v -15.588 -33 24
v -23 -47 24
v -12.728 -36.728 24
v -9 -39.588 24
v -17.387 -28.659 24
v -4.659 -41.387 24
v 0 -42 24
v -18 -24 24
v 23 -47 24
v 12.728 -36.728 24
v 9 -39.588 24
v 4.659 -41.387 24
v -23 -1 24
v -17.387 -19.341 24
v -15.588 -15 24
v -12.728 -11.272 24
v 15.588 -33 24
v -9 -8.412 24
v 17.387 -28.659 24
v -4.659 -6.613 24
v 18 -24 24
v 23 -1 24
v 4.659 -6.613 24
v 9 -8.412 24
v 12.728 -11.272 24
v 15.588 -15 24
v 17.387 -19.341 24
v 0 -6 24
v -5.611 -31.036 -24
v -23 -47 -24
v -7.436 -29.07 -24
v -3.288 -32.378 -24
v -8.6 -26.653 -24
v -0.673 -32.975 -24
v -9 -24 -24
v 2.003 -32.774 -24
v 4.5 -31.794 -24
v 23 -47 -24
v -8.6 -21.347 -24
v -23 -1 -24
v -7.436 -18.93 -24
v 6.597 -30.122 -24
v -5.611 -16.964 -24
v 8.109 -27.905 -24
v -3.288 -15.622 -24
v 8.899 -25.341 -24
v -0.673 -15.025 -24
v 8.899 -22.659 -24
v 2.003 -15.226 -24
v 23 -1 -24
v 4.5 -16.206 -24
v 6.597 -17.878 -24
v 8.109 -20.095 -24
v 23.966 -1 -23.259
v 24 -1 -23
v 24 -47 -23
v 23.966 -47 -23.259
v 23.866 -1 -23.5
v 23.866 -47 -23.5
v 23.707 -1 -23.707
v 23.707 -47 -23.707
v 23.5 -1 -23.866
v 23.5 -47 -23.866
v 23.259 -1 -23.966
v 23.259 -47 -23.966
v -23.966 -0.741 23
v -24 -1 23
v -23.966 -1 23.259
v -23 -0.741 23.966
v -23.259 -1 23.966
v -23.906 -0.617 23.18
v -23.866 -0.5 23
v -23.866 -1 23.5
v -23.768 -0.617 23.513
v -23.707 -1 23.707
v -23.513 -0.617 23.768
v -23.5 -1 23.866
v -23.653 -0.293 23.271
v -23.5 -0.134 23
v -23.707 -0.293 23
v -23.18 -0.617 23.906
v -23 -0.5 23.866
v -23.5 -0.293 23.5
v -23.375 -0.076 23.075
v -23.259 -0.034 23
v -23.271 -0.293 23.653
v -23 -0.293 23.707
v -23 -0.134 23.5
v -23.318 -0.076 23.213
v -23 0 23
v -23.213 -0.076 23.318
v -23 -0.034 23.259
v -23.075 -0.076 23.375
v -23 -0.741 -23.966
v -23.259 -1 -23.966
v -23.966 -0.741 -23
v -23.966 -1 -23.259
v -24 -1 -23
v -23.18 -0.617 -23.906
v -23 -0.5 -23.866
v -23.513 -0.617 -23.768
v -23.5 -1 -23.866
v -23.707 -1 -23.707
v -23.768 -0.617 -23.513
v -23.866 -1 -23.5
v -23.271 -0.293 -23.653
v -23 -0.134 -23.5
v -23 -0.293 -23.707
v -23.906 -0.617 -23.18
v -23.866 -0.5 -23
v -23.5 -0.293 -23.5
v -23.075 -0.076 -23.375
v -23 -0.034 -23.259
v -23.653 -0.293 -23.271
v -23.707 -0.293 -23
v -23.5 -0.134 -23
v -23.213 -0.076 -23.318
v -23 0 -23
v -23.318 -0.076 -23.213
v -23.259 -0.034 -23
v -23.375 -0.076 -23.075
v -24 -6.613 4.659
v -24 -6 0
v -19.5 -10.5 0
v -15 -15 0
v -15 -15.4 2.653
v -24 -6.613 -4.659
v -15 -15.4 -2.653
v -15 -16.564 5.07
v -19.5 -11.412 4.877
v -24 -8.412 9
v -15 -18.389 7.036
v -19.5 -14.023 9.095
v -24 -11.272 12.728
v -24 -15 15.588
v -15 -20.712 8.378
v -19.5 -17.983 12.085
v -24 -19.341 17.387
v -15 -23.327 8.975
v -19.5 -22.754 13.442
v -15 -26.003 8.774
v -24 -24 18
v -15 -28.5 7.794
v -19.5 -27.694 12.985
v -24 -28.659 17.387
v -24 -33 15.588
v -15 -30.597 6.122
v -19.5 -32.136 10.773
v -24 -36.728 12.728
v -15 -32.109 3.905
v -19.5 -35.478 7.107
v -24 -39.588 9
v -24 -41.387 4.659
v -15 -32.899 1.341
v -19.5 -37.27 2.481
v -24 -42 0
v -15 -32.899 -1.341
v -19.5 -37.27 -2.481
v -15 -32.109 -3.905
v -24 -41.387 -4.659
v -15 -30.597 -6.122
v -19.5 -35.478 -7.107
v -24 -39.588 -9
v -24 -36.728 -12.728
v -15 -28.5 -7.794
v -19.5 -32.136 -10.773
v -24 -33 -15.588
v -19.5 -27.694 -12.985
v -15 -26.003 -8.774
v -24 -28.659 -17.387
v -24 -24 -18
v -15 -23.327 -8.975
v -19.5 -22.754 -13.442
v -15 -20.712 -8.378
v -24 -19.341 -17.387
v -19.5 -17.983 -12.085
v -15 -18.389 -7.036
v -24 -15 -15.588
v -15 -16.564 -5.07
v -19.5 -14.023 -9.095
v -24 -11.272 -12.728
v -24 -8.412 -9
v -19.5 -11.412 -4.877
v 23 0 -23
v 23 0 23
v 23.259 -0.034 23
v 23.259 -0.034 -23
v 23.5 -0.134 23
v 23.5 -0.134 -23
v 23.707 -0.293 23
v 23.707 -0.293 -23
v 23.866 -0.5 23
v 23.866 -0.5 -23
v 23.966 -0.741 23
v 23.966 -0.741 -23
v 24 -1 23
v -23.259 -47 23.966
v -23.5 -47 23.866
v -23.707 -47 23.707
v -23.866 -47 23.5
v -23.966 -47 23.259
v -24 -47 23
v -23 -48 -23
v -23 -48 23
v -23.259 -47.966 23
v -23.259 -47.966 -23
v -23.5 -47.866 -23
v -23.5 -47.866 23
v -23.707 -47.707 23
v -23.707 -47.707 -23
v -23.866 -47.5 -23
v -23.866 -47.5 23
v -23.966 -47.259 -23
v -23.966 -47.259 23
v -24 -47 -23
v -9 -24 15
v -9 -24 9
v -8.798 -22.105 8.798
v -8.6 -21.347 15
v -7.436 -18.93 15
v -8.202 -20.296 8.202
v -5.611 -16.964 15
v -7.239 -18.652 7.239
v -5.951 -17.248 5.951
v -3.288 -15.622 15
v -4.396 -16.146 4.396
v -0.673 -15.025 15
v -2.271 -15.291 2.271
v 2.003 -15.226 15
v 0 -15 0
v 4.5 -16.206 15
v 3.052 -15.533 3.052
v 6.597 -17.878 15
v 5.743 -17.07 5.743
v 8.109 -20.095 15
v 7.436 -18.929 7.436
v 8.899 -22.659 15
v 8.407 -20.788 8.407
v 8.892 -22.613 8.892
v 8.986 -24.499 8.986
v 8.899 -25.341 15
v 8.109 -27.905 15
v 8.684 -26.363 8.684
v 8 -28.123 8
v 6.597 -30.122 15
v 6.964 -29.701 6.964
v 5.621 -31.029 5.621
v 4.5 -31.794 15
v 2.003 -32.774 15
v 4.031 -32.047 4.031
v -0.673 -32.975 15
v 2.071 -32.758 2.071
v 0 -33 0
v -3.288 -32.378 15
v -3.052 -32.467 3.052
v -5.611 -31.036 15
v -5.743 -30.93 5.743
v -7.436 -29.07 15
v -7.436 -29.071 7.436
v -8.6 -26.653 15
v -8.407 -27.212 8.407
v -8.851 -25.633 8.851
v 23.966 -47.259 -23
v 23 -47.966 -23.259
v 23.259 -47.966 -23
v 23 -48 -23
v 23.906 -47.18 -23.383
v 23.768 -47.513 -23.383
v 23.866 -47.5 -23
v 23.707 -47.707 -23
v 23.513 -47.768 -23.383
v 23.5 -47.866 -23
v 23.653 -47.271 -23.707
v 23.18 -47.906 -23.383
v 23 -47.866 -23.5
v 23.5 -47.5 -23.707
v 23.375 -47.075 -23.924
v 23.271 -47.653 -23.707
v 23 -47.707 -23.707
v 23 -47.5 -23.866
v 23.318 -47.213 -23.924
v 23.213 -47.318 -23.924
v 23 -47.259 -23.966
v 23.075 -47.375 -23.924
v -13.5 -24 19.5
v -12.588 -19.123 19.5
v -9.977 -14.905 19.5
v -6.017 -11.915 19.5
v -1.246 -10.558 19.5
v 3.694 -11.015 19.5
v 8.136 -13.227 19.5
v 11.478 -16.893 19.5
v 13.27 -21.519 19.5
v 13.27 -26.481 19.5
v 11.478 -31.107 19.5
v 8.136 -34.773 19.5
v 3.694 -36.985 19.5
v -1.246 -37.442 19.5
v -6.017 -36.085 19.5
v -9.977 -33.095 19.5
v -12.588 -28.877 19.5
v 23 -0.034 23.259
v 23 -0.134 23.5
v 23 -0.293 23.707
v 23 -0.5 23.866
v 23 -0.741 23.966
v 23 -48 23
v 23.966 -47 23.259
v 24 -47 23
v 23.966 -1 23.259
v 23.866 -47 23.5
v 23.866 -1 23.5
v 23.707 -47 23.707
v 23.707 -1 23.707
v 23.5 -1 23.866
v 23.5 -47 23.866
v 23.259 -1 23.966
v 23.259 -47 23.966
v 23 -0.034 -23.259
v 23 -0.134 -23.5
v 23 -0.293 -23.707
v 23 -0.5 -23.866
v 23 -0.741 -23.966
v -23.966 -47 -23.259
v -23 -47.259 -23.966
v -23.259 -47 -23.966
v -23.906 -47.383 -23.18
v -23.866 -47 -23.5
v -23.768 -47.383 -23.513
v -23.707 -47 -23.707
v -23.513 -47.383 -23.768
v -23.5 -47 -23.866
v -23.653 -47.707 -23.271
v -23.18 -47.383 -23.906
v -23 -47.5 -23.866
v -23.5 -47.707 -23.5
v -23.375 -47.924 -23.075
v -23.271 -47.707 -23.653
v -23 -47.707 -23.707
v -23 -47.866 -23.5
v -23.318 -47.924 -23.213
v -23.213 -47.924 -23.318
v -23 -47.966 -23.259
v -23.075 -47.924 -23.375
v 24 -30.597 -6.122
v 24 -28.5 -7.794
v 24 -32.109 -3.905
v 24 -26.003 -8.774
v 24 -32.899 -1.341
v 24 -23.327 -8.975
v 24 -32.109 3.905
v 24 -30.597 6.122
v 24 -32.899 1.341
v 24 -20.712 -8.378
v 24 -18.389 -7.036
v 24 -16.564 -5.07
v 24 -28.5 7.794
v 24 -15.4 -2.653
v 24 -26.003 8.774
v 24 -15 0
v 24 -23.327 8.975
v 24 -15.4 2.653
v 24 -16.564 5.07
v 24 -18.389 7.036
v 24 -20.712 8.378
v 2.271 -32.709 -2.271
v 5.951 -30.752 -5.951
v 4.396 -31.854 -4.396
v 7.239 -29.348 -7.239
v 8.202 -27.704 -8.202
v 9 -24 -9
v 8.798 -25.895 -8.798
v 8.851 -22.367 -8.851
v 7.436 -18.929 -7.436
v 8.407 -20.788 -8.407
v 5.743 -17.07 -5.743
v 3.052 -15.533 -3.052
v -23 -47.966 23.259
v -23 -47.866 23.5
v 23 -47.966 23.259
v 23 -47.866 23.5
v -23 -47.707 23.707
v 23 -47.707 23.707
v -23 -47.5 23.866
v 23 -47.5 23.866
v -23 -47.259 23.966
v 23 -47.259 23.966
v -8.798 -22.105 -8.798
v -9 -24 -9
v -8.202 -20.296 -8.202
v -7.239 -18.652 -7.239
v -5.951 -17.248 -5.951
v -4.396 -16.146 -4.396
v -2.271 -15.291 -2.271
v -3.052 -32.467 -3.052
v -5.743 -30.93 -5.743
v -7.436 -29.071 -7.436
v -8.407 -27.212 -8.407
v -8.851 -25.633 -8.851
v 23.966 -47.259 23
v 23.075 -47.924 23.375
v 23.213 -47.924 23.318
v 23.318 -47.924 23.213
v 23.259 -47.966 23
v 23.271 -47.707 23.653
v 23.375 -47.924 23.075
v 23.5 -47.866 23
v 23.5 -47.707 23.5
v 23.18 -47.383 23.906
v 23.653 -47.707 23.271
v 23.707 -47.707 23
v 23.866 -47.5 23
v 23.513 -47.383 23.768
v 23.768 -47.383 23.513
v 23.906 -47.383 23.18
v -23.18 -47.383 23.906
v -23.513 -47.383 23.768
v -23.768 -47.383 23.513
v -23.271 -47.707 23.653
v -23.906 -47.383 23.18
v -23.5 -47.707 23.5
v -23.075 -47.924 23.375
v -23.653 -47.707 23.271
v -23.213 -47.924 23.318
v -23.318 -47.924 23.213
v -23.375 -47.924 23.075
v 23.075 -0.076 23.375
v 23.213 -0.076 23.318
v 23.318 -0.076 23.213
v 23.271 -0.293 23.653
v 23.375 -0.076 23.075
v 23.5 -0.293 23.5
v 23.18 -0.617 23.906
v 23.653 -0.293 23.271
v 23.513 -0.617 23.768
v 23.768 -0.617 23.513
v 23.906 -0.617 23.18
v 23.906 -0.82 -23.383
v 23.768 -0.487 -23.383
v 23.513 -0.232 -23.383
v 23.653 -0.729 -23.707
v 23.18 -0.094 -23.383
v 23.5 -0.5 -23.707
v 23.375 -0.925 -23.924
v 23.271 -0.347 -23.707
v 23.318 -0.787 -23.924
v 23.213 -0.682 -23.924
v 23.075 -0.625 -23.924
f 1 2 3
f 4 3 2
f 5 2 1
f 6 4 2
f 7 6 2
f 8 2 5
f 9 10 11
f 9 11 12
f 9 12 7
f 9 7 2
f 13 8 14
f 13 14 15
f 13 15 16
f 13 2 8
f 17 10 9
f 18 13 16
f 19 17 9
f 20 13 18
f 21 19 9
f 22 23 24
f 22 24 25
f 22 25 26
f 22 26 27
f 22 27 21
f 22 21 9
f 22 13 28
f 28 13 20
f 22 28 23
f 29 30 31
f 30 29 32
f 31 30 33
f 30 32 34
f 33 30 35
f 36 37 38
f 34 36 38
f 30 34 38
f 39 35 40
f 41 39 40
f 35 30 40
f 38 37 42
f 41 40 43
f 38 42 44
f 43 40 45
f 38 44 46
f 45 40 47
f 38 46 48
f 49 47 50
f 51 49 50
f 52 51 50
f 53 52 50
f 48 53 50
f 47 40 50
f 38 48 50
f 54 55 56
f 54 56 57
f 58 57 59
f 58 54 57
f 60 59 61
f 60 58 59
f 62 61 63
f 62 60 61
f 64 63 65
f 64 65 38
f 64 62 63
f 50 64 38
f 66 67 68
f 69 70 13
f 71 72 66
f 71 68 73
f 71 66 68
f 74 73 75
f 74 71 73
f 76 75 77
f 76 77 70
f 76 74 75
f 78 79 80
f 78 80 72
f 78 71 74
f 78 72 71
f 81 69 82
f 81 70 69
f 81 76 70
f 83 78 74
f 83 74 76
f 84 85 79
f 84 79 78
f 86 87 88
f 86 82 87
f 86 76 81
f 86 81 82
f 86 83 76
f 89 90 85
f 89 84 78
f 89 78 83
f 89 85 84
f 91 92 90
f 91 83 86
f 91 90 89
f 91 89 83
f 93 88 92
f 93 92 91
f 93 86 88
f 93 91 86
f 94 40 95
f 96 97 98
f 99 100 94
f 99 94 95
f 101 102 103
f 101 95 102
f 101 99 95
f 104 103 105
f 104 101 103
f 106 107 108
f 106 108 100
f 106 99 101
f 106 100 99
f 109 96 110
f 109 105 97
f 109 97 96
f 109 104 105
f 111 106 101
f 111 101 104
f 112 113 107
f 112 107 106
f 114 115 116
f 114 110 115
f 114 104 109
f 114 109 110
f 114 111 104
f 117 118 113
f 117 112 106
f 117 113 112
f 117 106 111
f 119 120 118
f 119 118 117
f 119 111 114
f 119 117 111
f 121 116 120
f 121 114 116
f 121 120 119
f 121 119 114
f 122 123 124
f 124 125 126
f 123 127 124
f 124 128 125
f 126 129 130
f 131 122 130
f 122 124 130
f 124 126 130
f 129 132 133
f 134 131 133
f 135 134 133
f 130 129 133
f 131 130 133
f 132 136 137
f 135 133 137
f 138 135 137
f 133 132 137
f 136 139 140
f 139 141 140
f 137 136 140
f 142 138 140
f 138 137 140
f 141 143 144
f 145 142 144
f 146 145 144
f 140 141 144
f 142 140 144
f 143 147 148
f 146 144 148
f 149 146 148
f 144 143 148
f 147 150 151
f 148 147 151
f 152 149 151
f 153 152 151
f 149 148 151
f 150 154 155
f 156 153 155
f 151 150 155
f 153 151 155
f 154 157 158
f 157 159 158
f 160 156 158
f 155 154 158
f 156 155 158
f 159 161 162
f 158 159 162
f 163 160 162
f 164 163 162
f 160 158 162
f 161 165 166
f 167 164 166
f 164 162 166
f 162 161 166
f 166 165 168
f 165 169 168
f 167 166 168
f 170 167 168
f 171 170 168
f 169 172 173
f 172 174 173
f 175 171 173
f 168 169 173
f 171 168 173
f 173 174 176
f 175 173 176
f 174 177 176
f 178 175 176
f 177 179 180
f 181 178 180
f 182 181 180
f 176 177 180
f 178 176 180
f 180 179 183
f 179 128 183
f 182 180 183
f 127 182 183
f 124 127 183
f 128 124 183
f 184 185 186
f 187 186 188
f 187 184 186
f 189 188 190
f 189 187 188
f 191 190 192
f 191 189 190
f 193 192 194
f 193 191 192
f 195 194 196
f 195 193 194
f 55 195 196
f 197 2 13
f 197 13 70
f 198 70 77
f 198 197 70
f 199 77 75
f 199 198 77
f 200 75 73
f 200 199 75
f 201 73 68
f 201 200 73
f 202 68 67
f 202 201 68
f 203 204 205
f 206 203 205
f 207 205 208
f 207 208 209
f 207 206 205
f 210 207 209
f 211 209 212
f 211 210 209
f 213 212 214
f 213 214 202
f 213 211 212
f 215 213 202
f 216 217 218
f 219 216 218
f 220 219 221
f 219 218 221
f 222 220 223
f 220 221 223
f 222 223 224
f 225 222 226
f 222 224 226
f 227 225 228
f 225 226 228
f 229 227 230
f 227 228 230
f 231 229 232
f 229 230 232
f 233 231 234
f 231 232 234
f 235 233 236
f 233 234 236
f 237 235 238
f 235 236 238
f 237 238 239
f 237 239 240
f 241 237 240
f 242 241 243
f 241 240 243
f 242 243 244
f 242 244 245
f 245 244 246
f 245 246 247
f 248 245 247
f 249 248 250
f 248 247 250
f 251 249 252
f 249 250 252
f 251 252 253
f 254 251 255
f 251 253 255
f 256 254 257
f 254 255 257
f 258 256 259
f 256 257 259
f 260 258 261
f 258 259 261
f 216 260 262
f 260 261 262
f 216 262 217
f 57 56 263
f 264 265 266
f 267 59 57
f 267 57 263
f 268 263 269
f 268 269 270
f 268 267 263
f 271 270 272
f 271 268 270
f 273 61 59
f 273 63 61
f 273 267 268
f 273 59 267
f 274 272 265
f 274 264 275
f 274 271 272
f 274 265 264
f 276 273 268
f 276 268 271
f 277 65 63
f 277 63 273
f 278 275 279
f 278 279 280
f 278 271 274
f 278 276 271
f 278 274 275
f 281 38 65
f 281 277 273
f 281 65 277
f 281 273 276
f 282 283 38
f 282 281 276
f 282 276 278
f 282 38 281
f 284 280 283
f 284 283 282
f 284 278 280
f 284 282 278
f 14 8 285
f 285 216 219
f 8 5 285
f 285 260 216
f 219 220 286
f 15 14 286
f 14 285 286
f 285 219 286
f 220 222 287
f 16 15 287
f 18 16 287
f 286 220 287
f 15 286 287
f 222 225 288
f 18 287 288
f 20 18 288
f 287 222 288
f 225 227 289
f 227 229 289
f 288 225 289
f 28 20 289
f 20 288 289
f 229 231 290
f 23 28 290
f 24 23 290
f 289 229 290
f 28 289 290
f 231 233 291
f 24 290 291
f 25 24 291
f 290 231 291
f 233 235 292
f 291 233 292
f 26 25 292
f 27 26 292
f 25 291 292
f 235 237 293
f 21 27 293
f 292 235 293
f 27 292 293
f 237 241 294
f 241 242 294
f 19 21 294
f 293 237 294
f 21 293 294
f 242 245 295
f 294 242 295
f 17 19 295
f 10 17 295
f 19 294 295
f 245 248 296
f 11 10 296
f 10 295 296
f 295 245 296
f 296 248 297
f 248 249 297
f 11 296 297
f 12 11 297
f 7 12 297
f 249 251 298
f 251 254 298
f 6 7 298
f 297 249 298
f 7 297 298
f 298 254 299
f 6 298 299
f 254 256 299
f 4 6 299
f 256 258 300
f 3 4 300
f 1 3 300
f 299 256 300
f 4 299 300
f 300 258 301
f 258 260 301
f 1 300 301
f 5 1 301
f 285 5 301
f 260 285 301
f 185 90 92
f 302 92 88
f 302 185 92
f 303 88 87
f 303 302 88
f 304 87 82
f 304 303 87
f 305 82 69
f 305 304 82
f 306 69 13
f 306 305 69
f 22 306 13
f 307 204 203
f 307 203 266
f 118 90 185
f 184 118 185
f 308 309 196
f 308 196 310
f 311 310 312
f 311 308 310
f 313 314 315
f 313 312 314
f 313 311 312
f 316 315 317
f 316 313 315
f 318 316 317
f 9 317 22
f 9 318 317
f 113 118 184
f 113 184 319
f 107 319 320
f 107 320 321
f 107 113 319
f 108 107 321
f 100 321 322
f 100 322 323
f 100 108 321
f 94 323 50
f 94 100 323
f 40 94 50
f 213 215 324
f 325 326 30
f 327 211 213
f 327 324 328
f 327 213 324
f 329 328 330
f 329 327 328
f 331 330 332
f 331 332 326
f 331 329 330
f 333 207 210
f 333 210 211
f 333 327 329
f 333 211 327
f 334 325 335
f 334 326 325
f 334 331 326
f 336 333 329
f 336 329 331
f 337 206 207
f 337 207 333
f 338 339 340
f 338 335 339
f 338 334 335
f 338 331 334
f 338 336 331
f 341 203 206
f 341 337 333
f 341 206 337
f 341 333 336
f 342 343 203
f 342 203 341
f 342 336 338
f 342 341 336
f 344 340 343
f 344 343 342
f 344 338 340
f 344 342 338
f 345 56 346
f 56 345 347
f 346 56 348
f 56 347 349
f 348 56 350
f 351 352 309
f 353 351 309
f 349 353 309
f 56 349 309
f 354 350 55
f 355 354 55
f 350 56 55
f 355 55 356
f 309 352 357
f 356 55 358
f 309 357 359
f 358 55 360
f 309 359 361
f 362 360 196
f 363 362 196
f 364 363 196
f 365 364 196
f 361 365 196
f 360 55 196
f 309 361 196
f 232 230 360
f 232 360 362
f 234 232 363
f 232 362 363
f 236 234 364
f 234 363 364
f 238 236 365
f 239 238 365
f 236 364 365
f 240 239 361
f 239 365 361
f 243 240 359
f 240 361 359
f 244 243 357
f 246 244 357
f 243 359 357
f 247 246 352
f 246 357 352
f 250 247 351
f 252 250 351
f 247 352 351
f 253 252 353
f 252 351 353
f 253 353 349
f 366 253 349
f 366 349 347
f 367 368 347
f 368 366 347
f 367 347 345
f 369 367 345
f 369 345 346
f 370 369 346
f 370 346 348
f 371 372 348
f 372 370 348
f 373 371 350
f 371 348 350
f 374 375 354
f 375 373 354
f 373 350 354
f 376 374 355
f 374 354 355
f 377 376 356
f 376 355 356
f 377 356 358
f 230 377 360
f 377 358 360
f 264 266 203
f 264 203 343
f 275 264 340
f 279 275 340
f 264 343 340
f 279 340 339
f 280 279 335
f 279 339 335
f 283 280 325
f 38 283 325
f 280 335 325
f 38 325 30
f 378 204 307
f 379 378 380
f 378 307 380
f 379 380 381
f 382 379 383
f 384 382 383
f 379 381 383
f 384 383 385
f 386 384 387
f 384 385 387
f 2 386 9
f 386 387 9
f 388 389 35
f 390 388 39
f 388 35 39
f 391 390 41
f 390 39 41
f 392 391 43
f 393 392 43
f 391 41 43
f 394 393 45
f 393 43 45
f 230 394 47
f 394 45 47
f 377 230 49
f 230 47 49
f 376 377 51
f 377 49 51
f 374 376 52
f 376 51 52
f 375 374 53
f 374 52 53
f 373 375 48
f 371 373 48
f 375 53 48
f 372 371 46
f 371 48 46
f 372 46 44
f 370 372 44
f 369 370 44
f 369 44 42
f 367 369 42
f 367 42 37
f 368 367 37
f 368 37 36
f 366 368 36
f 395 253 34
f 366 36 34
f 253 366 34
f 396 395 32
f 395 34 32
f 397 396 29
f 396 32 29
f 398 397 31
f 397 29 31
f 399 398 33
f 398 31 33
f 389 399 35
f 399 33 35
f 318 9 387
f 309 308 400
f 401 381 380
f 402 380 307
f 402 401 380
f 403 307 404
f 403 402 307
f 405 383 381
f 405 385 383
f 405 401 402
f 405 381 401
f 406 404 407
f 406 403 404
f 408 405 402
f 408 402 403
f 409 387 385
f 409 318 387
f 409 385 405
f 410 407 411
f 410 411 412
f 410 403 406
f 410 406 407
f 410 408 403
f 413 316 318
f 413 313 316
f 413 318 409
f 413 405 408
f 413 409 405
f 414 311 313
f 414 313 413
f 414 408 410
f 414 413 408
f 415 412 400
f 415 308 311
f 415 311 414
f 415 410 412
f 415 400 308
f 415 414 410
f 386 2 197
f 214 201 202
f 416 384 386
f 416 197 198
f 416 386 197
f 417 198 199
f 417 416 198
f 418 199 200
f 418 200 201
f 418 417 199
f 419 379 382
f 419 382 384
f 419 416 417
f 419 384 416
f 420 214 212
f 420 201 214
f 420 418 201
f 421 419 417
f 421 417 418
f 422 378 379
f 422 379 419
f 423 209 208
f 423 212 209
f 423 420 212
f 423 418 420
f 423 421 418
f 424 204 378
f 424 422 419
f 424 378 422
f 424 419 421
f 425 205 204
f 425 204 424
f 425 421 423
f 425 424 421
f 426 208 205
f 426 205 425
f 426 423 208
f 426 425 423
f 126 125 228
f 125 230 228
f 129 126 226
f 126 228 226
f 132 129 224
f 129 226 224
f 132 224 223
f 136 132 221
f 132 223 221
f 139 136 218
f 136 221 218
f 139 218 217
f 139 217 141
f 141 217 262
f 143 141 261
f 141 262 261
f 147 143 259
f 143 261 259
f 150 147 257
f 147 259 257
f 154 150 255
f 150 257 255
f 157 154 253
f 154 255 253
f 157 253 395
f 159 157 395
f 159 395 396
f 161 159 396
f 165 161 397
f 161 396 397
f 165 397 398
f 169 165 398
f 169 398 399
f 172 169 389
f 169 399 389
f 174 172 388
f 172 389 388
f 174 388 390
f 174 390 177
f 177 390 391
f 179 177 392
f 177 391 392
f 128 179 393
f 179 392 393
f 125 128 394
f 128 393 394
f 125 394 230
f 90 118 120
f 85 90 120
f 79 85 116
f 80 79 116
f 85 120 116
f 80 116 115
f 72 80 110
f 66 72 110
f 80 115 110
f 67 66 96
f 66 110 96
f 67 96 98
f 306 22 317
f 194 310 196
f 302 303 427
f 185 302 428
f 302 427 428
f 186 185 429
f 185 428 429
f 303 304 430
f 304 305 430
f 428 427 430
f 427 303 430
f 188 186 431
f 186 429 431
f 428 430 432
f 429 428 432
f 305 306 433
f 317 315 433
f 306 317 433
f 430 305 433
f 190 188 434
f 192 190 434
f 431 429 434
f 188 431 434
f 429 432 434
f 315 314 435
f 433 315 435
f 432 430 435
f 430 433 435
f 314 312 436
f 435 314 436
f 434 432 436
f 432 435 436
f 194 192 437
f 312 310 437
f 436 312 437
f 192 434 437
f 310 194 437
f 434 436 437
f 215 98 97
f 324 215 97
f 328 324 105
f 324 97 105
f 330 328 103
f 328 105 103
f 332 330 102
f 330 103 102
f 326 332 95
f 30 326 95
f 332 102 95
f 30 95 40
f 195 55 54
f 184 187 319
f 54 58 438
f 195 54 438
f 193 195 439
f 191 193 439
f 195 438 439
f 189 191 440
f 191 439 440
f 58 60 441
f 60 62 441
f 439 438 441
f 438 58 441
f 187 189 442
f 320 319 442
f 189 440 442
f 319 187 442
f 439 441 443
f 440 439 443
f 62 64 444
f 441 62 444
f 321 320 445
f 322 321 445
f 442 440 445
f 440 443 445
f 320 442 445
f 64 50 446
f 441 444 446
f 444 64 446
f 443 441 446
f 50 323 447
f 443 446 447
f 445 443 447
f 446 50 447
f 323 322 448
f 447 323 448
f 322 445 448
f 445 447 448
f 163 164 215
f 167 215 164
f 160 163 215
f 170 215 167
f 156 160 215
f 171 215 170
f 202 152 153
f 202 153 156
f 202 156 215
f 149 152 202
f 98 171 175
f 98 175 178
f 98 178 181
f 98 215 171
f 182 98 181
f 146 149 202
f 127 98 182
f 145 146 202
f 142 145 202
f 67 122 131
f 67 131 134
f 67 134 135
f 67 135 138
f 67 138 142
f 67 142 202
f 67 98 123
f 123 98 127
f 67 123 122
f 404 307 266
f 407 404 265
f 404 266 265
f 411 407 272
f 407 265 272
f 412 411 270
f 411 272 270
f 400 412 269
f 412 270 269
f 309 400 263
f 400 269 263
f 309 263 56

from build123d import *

# Parameters (mm, degrees)
F0_W           = 48
F0_H           = 48
F1_DEPTH       = 48
F2_R           = 1
F3_R           = 1
F4_T1_DEPTH    = 46
F4_T3_DEPTH    = 46
F4_T5_DEPTH    = 46
F4_S9_W        = 1
F4_S9_H        = 1
F4_T10_DEPTH   = 1
F4_S15_W       = 1
F4_S15_H       = 1
F4_T16_DEPTH   = 1
F4_S21_W       = 1
F4_S21_H       = 1
F4_T22_DEPTH   = 1
F4_S27_W       = 1
F4_S27_H       = 1
F4_T28_DEPTH   = 1
F4_T32_ANGLE   = 90
F4_T34_ANGLE   = 90
F6_D           = 18
F6_CSINK_D     = 36
F6_CSINK_ANGLE = 90
F8_D           = 18
F8_CSINK_D     = 36
F8_CSINK_ANGLE = 90


# Not quite as in the source:
# - a fillet or chamfer that OpenCascade refuses, or shapes differently, is made with other operations: its cross-section is extruded or revolved along the edge and cut away or added


with BuildPart() as f1:
    # F0 (on Front) → F1 (new body)
    with BuildSketch(Plane.XZ):
        Rectangle(F0_W, F0_H)
    extrude(amount=F1_DEPTH)

    # F2
    f2_edges = [f1.edges().sort_by_distance(p)[0] for p in [
        (24, -24, 24),
    ]]
    fillet(f2_edges, radius=F2_R)

    # F3
    f3_edges = [f1.edges().sort_by_distance(p)[0] for p in [
        (-24, -24, 24),
        (-0.5, 0, 24),
        (-0.5, -48, 24),
    ]]
    fillet(f3_edges, radius=F3_R)

    # F4: fillet of radius 1 on 8 edges, made by hand

    # F4_s2 → F4_t1 (cut)
    with BuildSketch(Plane.XY.offset(-23)):
        with BuildLine():
            ThreePointArc((-23, -48), (-23.7071067812, -47.7071067812), (-24, -47))
            Line((-24, -47), (-24, -48))
            Line((-24, -48), (-23, -48))
        make_face()
        with BuildLine():
            ThreePointArc((-23, 0), (-23.7071067812, -0.2928932188), (-24, -1))
            Line((-24, -1), (-24, 0))
            Line((-24, 0), (-23, 0))
        make_face()
    extrude(amount=F4_T1_DEPTH, mode=Mode.SUBTRACT)

    # F4_s4 → F4_t3 (cut)
    with BuildSketch(Plane.YZ.offset(-23)):
        with BuildLine():
            ThreePointArc((0, -23), (-0.2928932188, -23.7071067812), (-1, -24))
            Line((-1, -24), (0, -24))
            Line((0, -24), (0, -23))
        make_face()
        with BuildLine():
            ThreePointArc((-48, -23), (-47.7071067812, -23.7071067812), (-47, -24))
            Line((-47, -24), (-48, -24))
            Line((-48, -24), (-48, -23))
        make_face()
    extrude(amount=F4_T3_DEPTH, mode=Mode.SUBTRACT)

    # F4_s6 → F4_t5 (cut)
    with BuildSketch(Plane.XZ.offset(1)):
        with BuildLine():
            ThreePointArc((-24, -23), (-23.7071067812, -23.7071067812), (-23, -24))
            Line((-23, -24), (-24, -24))
            Line((-24, -24), (-24, -23))
        make_face()
        with BuildLine():
            ThreePointArc((24, -23), (23.7071067812, -23.7071067812), (23, -24))
            Line((23, -24), (24, -24))
            Line((24, -24), (24, -23))
        make_face()
    extrude(amount=F4_T5_DEPTH, mode=Mode.SUBTRACT)


with BuildPart() as f4_tool8:
    # F4_s9 → F4_t10 (new body)
    with BuildSketch(Plane.XZ.offset(1)):
        with Locations((-23.5, 23.5)):
            Rectangle(F4_S9_W, F4_S9_H)
    extrude(amount=-F4_T10_DEPTH)

    # F4_s11 → F4_t12 (revolve, cut)
    with BuildSketch(Plane(origin=(-23, -1, 23), x_dir=(0.7071067812, 0, -0.7071067812), z_dir=(0.7071067812, 0, 0.7071067812))):
        with BuildLine():
            ThreePointArc((0, -1), (1, 0), (0, 1))
            Line((0, 1), (0, -1))
        make_face()
    revolve(axis=Axis((-23, -1, 23), (0, 1, 0)), mode=Mode.SUBTRACT)


with BuildPart() as f1_1:
    add(f1.part)

    # F4_t7: cut F4_tool8
    add(f4_tool8.part, mode=Mode.SUBTRACT)


with BuildPart() as f4_tool14:
    # F4_s15 → F4_t16 (new body)
    with BuildSketch(Plane.XZ.offset(47)):
        with Locations((-23.5, 23.5)):
            Rectangle(F4_S15_W, F4_S15_H)
    extrude(amount=F4_T16_DEPTH)

    # F4_s17 → F4_t18 (revolve, cut)
    with BuildSketch(Plane(origin=(-23, -47, 23), x_dir=(0.7071067812, 0, -0.7071067812), z_dir=(-0.7071067812, 0, -0.7071067812))):
        with BuildLine():
            ThreePointArc((0, -1), (1, 0), (0, 1))
            Line((0, 1), (0, -1))
        make_face()
    revolve(axis=Axis((-23, -47, 23), (0, -1, 0)), mode=Mode.SUBTRACT)


with BuildPart() as f1_2:
    add(f1_1.part)

    # F4_t13: cut F4_tool14
    add(f4_tool14.part, mode=Mode.SUBTRACT)


with BuildPart() as f4_tool20:
    # F4_s21 → F4_t22 (new body)
    with BuildSketch(Plane.XZ.offset(47)):
        with Locations((-23.5, -23.5)):
            Rectangle(F4_S21_W, F4_S21_H)
    extrude(amount=F4_T22_DEPTH)

    # F4_s23 → F4_t24 (revolve, cut)
    with BuildSketch(Plane(origin=(-23, -47, -23), x_dir=(0.7071067812, 0, 0.7071067812), z_dir=(0.7071067812, 0, -0.7071067812))):
        with BuildLine():
            ThreePointArc((0, -1), (1, 0), (0, 1))
            Line((0, 1), (0, -1))
        make_face()
    revolve(axis=Axis((-23, -47, -23), (0, -1, 0)), mode=Mode.SUBTRACT)


with BuildPart() as f1_3:
    add(f1_2.part)

    # F4_t19: cut F4_tool20
    add(f4_tool20.part, mode=Mode.SUBTRACT)


with BuildPart() as f4_tool26:
    # F4_s27 → F4_t28 (new body)
    with BuildSketch(Plane.XZ.offset(1)):
        with Locations((-23.5, -23.5)):
            Rectangle(F4_S27_W, F4_S27_H)
    extrude(amount=-F4_T28_DEPTH)

    # F4_s29 → F4_t30 (revolve, cut)
    with BuildSketch(Plane(origin=(-23, -1, -23), x_dir=(0.7071067812, 0, 0.7071067812), z_dir=(-0.7071067812, 0, 0.7071067812))):
        with BuildLine():
            ThreePointArc((0, -1), (1, 0), (0, 1))
            Line((0, 1), (0, -1))
        make_face()
    revolve(axis=Axis((-23, -1, -23), (0, 1, 0)), mode=Mode.SUBTRACT)


with BuildPart() as f1_4:
    add(f1_3.part)

    # F4_t25: cut F4_tool26
    add(f4_tool26.part, mode=Mode.SUBTRACT)

    # F4_s31 → F4_t32 (revolve, cut)
    with BuildSketch(Plane.XZ.offset(1)):
        with BuildLine():
            ThreePointArc((24, -23), (23.7071067812, -23.7071067812), (23, -24))
            Line((23, -24), (24, -24))
            Line((24, -24), (24, -23))
        make_face()
    revolve(axis=Axis((23, -1, -24), (0, 0, 1)), revolution_arc=F4_T32_ANGLE, mode=Mode.SUBTRACT)

    # F4_s33 → F4_t34 (revolve, cut)
    with BuildSketch(Plane.XZ.offset(47)):
        with BuildLine():
            ThreePointArc((24, -23), (23.7071067812, -23.7071067812), (23, -24))
            Line((23, -24), (24, -24))
            Line((24, -24), (24, -23))
        make_face()
    revolve(axis=Axis((23, -47, -24), (0, 0, -1)), revolution_arc=F4_T34_ANGLE, mode=Mode.SUBTRACT)

    # F6 (through all)
    with Locations(Plane.XY.offset(24)):
        with Locations((0, -24)):
            CounterSinkHole(F6_D / 2, F6_CSINK_D / 2, counter_sink_angle=F6_CSINK_ANGLE)

    # F8 (through all)
    with Locations(Plane(origin=(-24, 0, 0), x_dir=(0, -1, 0), z_dir=(-1, 0, 0))):
        with Locations((24, 0)):
            CounterSinkHole(F8_D / 2, F8_CSINK_D / 2, counter_sink_angle=F8_CSINK_ANGLE)


solid = f1_4.part
